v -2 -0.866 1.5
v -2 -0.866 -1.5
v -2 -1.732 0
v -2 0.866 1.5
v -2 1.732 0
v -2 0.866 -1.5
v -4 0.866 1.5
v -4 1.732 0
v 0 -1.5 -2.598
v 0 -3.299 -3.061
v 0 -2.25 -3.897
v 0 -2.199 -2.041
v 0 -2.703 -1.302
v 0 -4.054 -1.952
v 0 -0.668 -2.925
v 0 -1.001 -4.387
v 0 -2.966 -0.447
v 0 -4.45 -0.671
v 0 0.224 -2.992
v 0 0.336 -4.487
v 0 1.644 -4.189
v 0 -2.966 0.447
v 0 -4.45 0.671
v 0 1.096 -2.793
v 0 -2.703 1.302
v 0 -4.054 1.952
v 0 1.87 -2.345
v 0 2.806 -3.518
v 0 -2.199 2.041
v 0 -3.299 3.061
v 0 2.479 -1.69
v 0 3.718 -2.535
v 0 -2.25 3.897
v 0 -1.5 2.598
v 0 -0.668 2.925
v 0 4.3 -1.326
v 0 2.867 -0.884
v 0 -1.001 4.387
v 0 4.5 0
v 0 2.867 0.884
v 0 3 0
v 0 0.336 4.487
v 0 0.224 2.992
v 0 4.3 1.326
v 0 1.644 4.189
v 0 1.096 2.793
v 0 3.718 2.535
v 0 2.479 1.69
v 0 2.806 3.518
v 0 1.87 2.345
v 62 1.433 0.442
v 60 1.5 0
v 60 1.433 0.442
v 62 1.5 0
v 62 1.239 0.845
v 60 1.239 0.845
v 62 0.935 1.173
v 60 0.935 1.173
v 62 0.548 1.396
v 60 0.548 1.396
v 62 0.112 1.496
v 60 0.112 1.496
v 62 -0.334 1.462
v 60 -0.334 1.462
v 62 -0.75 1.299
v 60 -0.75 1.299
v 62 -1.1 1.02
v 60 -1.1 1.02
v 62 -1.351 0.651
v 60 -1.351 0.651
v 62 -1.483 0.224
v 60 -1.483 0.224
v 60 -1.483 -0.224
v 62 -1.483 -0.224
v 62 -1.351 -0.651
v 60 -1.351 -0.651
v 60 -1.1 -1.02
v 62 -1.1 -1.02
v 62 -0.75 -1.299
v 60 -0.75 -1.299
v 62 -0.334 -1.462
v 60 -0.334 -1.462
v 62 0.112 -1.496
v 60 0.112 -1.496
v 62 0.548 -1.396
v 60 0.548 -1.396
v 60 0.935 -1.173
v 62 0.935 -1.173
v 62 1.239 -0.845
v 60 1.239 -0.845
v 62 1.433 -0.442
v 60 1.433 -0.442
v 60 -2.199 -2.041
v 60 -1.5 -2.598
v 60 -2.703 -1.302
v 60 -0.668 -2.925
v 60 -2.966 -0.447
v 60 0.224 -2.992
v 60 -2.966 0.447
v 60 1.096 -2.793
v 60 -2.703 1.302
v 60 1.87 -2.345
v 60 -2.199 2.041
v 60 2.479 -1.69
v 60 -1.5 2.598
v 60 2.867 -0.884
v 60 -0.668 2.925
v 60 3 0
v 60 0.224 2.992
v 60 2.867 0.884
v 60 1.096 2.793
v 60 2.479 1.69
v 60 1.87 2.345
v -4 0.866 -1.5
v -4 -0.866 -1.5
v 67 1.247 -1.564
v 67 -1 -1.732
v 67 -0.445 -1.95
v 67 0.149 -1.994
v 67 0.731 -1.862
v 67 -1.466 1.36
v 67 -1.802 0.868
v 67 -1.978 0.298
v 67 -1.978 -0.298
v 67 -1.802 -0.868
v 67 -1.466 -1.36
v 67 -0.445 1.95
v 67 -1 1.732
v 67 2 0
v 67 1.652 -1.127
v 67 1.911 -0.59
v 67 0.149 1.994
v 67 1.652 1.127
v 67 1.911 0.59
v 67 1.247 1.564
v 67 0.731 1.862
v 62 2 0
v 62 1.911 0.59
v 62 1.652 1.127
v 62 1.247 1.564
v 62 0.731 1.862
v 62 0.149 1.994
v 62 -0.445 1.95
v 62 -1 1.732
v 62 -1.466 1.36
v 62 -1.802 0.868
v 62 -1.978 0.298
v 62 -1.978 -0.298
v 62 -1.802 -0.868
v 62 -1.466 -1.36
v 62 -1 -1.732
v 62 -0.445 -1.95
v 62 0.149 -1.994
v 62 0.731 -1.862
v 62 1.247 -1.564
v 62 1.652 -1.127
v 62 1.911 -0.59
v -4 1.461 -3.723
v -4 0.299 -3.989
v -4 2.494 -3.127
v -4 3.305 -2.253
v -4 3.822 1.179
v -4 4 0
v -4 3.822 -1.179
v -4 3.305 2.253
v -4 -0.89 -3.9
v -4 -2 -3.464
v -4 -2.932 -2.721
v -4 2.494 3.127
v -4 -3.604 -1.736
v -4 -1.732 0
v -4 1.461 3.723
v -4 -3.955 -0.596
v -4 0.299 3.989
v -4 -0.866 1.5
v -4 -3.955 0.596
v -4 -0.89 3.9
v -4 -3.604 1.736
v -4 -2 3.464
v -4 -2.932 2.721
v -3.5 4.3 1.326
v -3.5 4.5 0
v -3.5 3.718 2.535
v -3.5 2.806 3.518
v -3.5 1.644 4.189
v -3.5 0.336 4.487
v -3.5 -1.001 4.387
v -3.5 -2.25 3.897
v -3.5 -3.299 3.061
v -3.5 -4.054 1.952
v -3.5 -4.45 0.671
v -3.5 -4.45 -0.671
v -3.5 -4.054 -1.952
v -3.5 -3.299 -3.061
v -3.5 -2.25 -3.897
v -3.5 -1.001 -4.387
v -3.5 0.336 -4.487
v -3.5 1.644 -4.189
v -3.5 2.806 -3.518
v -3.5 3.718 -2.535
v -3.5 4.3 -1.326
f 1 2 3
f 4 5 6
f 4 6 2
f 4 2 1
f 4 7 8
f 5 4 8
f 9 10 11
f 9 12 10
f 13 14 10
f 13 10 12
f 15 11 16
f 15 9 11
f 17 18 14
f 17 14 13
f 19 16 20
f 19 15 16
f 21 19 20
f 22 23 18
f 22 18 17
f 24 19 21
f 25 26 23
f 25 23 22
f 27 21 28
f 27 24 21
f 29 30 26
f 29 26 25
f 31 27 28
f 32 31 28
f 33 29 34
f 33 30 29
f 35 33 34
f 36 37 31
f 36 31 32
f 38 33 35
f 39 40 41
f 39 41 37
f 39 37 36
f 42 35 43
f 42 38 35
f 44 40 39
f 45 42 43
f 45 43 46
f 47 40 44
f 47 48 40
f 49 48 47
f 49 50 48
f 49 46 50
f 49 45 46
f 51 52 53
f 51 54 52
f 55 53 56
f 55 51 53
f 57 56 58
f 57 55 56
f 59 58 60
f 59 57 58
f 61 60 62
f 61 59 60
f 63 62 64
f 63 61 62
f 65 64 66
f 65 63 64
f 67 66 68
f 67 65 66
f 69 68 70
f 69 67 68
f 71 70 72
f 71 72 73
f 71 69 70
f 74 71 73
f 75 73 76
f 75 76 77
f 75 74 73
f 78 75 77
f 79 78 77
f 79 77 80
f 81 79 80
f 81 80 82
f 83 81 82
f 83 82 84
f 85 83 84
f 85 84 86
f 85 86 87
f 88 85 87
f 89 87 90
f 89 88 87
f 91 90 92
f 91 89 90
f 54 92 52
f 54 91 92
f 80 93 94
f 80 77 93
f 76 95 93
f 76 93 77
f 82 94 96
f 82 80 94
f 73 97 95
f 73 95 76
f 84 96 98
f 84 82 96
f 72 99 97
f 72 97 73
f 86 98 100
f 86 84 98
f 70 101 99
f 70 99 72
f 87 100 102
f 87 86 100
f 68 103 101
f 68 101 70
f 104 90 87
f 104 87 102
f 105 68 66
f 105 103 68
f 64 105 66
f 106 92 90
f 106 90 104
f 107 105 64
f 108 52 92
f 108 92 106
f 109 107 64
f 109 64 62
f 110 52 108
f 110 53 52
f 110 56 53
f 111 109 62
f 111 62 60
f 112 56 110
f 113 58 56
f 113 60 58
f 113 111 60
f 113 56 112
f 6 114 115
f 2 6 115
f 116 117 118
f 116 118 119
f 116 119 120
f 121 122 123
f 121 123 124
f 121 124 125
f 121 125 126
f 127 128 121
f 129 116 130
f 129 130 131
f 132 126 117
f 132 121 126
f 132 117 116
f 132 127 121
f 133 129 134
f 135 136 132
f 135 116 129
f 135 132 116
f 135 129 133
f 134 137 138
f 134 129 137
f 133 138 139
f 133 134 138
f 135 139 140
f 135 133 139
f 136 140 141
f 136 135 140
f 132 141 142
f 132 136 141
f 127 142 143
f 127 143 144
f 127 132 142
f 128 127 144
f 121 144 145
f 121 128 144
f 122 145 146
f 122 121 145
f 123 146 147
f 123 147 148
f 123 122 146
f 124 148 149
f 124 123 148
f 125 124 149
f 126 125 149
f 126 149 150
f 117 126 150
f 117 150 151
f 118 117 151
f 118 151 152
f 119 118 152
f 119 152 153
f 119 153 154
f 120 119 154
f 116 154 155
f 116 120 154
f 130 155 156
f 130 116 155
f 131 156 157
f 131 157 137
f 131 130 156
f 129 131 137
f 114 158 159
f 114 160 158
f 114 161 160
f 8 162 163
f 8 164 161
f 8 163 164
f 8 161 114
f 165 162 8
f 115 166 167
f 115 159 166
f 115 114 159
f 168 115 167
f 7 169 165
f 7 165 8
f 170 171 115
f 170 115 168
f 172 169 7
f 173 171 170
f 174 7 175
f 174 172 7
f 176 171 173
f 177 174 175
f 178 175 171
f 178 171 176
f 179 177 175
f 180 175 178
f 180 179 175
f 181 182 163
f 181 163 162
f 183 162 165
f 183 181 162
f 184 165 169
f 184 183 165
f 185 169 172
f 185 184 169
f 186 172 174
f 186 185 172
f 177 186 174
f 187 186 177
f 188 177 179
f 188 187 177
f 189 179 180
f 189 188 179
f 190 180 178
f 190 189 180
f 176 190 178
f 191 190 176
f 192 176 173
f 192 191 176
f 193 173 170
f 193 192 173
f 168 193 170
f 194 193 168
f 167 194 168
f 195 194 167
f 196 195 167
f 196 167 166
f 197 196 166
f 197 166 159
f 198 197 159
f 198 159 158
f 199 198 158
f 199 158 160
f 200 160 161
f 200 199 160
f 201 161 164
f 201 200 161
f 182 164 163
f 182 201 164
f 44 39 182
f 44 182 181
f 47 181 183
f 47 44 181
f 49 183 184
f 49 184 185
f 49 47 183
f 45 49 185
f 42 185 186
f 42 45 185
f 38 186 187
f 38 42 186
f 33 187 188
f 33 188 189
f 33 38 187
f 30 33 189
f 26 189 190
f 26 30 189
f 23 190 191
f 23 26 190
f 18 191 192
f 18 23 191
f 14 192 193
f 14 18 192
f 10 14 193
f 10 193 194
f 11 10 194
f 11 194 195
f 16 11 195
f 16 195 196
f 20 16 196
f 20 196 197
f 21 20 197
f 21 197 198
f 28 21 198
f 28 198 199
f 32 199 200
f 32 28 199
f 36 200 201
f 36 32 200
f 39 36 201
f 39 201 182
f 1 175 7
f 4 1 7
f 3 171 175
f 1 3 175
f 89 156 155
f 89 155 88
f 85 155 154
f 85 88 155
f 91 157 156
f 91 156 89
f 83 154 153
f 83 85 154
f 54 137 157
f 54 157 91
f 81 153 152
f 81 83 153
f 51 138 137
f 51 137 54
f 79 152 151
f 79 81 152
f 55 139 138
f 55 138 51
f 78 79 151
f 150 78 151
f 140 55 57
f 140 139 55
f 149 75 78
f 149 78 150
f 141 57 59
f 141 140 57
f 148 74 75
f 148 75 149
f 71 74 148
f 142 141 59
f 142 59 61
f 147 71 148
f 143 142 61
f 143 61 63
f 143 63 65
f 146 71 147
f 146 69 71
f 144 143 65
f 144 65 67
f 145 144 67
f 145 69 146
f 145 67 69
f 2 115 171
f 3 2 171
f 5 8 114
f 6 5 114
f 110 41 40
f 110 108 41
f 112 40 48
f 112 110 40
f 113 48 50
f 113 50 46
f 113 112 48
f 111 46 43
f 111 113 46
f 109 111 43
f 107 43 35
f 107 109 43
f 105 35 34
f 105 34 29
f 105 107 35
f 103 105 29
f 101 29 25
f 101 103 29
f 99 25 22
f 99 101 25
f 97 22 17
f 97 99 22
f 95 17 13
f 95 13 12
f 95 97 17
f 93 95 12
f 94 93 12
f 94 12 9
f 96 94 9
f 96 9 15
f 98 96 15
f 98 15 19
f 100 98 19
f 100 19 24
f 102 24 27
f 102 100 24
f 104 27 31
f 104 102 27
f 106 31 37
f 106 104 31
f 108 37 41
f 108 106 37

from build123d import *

# Parameters (mm, degrees)
CHAMFER2_SIZE      = 0.5
CUT_EXTRUDE1_DEPTH = 2


with BuildPart() as part:
    # Sketch1 → Revolve1 (revolve)
    with BuildSketch(Plane.XY):
        Polygon((0, 3), (60, 3), (60, 1.5), (62, 1.5), (62, 2), (67, 2), (67, 0), (-4, 0), (-4, 4.5), (0, 4.5), align=None)
    revolve(axis=Axis((-15.448246648, 0, 0), (1, 0, 0)))

    # Chamfer2
    chamfer2_edges = [part.edges().sort_by_distance(p)[0] for p in [
        (-4, -4.5, 0),
    ]]
    chamfer(chamfer2_edges, length=CHAMFER2_SIZE)

    # Sketch2 → Cut-Extrude1 (cut)
    with BuildSketch(Plane.ZY.offset(4)):
        Polygon((0, 1.732050808), (-1.5, 0.866025404), (-1.5, -0.866025404), (0, -1.732050808), (1.5, -0.866025404), (1.5, 0.866025404), align=None)
    extrude(amount=-CUT_EXTRUDE1_DEPTH, mode=Mode.SUBTRACT)


solid = part.part
